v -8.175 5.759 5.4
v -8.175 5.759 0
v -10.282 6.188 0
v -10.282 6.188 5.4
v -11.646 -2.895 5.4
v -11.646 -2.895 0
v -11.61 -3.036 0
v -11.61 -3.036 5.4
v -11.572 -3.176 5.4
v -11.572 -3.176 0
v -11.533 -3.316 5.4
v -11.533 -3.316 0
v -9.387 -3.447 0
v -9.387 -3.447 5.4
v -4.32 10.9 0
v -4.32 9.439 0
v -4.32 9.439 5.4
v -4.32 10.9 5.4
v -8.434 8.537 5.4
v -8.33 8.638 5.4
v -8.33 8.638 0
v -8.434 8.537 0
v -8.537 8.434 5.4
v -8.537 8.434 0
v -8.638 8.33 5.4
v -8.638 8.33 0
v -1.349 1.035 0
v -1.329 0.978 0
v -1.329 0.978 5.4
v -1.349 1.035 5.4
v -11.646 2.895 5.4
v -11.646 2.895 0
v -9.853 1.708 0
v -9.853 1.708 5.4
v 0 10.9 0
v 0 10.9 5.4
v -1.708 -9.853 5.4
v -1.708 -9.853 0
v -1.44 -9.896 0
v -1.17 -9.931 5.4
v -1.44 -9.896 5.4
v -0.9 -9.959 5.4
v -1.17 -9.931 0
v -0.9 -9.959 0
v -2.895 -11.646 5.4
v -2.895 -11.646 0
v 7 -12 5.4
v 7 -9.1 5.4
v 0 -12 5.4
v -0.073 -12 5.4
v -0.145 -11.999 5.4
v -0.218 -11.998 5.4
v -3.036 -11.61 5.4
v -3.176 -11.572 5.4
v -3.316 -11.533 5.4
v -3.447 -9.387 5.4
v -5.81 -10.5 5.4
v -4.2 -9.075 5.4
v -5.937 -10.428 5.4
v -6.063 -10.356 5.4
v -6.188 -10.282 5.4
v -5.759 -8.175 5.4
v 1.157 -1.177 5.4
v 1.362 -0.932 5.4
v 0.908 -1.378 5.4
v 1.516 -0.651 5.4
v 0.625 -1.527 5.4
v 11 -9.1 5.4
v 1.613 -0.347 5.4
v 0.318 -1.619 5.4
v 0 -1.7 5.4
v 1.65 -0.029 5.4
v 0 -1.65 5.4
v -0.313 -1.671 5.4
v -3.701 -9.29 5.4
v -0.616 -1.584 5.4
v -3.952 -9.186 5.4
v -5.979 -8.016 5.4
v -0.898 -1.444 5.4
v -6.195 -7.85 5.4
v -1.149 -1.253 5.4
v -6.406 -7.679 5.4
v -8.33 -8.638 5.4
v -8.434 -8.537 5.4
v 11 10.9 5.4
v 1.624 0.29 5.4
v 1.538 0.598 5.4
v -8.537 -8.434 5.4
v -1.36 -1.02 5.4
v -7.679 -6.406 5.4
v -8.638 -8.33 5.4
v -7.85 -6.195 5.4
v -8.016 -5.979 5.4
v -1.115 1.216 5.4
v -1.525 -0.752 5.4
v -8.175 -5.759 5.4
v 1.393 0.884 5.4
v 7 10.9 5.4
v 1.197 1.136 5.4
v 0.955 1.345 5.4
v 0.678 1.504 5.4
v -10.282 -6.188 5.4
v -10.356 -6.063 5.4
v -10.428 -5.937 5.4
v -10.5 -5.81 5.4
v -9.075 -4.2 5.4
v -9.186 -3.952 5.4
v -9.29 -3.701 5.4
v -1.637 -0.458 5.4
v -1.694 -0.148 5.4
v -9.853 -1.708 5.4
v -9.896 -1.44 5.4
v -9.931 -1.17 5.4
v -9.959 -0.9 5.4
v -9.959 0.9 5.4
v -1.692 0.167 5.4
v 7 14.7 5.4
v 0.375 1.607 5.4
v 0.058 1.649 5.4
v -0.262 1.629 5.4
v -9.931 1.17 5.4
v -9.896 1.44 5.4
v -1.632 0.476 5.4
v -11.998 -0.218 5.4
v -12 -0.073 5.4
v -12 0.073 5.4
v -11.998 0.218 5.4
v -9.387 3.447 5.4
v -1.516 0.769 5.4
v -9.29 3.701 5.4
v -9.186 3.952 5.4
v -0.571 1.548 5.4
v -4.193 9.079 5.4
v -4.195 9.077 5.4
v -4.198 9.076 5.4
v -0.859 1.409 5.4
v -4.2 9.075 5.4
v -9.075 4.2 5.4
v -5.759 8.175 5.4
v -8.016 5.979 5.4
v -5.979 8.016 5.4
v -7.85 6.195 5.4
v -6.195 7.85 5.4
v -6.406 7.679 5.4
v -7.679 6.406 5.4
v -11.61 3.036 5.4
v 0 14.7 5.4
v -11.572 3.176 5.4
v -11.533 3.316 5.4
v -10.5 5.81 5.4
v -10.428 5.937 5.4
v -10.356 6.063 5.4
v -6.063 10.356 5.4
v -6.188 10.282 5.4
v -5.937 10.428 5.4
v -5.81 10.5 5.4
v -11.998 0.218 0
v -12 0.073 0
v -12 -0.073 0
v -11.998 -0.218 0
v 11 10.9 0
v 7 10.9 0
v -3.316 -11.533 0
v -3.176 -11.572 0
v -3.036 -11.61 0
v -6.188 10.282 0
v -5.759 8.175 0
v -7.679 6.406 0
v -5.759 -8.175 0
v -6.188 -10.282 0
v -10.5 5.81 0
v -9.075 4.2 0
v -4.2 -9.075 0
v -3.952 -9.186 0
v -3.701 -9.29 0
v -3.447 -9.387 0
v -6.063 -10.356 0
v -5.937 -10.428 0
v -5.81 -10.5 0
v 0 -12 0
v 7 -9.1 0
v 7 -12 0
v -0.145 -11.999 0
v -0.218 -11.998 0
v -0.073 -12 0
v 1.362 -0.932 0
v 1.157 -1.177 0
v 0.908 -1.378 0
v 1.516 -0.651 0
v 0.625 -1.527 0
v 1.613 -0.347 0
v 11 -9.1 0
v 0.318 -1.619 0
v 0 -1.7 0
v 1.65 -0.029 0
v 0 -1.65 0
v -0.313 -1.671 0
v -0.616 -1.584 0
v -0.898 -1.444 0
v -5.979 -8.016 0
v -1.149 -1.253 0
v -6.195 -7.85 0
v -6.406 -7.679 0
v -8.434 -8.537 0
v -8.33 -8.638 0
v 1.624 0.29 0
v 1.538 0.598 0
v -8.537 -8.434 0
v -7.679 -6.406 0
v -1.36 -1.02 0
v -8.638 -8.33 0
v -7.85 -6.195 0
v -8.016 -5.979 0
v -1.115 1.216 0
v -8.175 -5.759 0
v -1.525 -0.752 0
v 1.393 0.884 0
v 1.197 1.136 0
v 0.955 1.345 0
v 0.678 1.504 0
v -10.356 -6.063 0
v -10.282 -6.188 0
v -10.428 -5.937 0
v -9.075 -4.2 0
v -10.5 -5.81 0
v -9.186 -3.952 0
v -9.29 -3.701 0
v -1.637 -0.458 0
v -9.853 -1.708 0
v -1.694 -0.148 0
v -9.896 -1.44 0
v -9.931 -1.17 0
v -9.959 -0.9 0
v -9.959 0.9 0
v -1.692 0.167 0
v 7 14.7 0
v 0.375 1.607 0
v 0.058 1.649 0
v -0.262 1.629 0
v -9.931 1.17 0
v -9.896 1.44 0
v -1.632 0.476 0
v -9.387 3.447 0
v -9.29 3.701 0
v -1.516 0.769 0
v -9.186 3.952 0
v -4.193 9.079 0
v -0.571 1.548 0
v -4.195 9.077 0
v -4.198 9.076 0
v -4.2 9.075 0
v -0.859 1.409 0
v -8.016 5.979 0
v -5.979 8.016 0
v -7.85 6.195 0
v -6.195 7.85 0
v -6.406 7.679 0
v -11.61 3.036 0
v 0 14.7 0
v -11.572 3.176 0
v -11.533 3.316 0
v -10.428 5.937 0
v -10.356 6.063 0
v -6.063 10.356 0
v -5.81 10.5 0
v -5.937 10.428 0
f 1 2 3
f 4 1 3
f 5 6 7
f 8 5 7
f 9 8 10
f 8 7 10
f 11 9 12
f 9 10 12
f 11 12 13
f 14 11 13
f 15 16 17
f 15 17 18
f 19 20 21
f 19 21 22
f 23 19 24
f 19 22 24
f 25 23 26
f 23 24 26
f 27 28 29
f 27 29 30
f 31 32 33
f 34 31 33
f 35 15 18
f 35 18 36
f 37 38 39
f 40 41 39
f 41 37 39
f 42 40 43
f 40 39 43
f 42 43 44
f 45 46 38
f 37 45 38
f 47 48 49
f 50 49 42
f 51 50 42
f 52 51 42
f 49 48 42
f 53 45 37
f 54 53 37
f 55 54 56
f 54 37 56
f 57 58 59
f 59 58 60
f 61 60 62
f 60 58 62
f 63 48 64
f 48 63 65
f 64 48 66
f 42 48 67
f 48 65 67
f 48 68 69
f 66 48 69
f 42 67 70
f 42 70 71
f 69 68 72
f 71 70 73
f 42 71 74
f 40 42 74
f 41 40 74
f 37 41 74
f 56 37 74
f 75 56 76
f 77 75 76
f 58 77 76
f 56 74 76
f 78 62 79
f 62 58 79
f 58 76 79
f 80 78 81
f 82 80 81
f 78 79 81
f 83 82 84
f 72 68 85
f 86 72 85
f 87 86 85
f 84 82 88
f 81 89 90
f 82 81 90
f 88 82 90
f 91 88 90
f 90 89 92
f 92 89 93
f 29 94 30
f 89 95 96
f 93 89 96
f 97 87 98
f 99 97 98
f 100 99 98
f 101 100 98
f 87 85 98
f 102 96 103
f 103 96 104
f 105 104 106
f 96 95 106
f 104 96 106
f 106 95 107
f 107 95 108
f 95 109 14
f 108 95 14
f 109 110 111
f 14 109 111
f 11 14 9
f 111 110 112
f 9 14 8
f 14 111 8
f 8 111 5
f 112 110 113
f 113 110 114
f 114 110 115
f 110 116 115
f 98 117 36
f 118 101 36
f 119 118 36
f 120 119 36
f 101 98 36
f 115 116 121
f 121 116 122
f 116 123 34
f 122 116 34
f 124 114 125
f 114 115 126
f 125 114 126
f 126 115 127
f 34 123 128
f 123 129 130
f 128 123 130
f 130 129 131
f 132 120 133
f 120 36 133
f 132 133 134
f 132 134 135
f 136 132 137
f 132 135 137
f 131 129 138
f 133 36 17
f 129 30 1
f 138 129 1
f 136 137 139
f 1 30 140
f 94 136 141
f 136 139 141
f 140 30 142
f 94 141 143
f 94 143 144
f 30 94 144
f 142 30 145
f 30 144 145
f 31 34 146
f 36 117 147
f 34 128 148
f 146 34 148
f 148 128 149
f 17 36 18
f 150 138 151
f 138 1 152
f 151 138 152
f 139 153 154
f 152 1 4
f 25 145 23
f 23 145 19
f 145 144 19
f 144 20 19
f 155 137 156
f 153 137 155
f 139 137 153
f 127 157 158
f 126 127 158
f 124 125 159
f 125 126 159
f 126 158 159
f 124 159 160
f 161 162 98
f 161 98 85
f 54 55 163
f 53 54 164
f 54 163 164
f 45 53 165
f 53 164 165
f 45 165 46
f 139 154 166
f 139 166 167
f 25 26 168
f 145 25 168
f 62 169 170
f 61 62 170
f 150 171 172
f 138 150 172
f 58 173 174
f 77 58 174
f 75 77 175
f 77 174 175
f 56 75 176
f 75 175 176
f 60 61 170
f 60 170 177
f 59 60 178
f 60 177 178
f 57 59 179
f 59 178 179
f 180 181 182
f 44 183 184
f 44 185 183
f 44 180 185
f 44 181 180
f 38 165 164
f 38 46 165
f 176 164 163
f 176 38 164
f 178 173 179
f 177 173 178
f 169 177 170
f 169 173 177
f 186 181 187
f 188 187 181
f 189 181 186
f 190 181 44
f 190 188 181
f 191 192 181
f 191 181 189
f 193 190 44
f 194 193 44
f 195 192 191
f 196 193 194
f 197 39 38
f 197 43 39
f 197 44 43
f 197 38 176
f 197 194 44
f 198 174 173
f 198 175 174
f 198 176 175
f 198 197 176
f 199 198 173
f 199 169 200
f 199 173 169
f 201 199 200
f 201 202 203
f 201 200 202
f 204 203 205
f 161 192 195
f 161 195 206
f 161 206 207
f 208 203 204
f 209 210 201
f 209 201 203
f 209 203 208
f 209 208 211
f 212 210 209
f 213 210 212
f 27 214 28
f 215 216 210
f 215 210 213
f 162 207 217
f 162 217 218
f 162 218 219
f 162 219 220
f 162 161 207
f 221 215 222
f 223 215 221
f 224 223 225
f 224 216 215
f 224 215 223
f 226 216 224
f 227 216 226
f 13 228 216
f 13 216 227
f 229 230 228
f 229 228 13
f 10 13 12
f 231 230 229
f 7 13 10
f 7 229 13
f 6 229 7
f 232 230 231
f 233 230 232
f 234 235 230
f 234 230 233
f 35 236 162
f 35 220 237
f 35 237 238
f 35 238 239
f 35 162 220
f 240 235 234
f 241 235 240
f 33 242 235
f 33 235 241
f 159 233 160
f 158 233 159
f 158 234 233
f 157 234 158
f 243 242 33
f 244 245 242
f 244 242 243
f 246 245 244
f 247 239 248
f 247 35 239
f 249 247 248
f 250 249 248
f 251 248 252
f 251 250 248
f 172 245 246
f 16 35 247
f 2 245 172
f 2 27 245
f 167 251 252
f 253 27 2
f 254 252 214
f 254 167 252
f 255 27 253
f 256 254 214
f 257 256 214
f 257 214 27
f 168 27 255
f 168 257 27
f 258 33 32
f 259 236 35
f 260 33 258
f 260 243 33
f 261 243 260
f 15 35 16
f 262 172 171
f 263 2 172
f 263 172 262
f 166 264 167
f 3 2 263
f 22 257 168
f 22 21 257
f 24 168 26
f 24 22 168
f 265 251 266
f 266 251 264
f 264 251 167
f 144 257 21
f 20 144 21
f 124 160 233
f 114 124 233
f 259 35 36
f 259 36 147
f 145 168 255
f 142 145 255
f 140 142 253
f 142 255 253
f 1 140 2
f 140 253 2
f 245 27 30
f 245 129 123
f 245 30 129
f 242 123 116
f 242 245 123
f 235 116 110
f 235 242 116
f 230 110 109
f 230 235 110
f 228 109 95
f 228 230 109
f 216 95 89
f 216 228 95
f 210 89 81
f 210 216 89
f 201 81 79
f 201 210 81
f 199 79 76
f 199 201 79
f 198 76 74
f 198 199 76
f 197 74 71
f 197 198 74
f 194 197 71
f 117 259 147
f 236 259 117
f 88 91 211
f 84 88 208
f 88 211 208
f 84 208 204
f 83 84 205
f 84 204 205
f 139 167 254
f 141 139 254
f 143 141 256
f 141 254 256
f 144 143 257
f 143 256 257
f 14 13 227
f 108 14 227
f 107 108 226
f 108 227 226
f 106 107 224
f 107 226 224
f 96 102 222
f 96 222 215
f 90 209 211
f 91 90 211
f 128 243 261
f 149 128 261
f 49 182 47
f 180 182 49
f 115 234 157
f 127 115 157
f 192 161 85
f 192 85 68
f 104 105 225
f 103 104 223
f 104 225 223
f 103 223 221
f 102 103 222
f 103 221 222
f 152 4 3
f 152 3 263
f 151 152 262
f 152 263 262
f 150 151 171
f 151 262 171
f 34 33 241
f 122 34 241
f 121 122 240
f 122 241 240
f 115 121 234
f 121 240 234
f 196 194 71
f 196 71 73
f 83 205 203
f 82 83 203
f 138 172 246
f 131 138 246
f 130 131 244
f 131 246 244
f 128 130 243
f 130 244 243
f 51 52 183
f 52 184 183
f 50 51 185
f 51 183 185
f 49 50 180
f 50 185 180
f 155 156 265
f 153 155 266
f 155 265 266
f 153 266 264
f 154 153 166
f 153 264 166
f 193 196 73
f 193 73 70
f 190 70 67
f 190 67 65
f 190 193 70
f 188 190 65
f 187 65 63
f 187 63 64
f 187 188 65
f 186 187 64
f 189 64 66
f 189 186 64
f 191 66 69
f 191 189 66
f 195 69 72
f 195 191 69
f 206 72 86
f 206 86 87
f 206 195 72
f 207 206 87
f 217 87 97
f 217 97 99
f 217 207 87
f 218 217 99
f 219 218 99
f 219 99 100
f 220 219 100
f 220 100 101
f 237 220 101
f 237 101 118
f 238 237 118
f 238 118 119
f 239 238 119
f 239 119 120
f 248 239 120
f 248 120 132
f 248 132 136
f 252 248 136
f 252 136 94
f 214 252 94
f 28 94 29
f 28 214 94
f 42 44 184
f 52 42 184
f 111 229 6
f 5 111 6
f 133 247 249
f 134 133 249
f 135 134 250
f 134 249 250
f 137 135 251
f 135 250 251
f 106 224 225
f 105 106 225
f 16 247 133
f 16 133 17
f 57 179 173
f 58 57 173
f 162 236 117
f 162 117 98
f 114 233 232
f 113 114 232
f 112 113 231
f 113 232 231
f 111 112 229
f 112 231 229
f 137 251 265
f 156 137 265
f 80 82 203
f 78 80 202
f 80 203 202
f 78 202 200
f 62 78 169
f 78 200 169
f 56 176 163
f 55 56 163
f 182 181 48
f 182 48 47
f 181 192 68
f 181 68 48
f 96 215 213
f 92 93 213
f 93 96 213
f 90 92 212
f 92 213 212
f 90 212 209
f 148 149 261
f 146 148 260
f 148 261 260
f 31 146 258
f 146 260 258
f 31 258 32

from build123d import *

# Parameters (mm, degrees)
SKETCH1_R           = 10
BOSS_EXTRUDE1_DEPTH = 5.4
BOSS_EXTRUDE2_DEPTH = 5.4
CIRPATTERN1_COUNT   = 24
SKETCH3_R           = 12.65
SKETCH3_R_2         = 12
CUT_EXTRUDE1_DEPTH  = 6
CUT_EXTRUDE2_DEPTH  = 6
SKETCH5_R           = 1.7
CUT_EXTRUDE3_DEPTH  = 6
BOSS_EXTRUDE3_DEPTH = 5.4


with BuildPart() as part:
    # Sketch1 → Boss-Extrude1 (new body)
    with BuildSketch(Plane.XY):
        Circle(SKETCH1_R)
    extrude(amount=BOSS_EXTRUDE1_DEPTH)

    # Sketch2 → Boss-Extrude2 (add)
    with BuildSketch(Plane.XY):
        with BuildLine():
            Line((0, 12.65), (-0.9, 9.959417654))
            ThreePointArc((-0.9, 9.959417654), (0, 10), (0.9, 9.959417654))
            Line((0.9, 9.959417654), (0, 12.65))
        make_face()
    boss_extrude2 = extrude(amount=BOSS_EXTRUDE2_DEPTH)

    # CirPattern1: Boss-Extrude2 ×24 about axis
    cirpattern1_axis = Axis((0, 0, 0), (0, 0, 1))
    for i in range(1, CIRPATTERN1_COUNT):
        add(boss_extrude2.rotate(cirpattern1_axis, i * 360 / CIRPATTERN1_COUNT))

    # Sketch3 → Cut-Extrude1 (cut)
    with BuildSketch(Plane.XY):
        Circle(SKETCH3_R)
        Circle(SKETCH3_R_2, mode=Mode.SUBTRACT)
    extrude(amount=CUT_EXTRUDE1_DEPTH, mode=Mode.SUBTRACT)

    # Sketch4 → Cut-Extrude2 (cut)
    with BuildSketch(Plane.XY):
        with BuildLine():
            Line((0, 0), (0, -12))
            ThreePointArc((0, -12), (11.769423365, 2.341083864), (-4.592201188, 11.08655439))
            Line((-4.592201188, 11.08655439), (-3.826834324, 9.238795325))
            Line((-3.826834324, 9.238795325), (0, 0))
        make_face()
    extrude(amount=CUT_EXTRUDE2_DEPTH, mode=Mode.SUBTRACT)

    # Sketch5 → Cut-Extrude3 (cut)
    with BuildSketch(Plane.XY):
        Circle(SKETCH5_R)
    extrude(amount=CUT_EXTRUDE3_DEPTH, mode=Mode.SUBTRACT)

    # Sketch6 → Boss-Extrude3 (add)
    with BuildSketch(Plane.XY):
        with BuildLine():
            Line((-4.32, 9.438795325), (-4.32, 10.9))
            Line((-4.32, 10.9), (0, 10.9))
            Line((0, 10.9), (0, 14.7))
            Line((0, 14.7), (7, 14.7))
            Line((7, 14.7), (7, 10.9))
            Line((7, 10.9), (11, 10.9))
            Line((11, 10.9), (11, -9.1))
            Line((11, -9.1), (7, -9.1))
            Line((7, -9.1), (7, -12))
            Line((7, -12), (0, -12))
            Line((0, -12), (0, -1.65))
            ThreePointArc((0, -1.65), (1.472580529, 0.744316187), (-1.328564272, 0.978476865))
            Line((-1.328564272, 0.978476865), (-4.32, 9.438795325))
        make_face()
    extrude(amount=BOSS_EXTRUDE3_DEPTH)


solid = part.part
